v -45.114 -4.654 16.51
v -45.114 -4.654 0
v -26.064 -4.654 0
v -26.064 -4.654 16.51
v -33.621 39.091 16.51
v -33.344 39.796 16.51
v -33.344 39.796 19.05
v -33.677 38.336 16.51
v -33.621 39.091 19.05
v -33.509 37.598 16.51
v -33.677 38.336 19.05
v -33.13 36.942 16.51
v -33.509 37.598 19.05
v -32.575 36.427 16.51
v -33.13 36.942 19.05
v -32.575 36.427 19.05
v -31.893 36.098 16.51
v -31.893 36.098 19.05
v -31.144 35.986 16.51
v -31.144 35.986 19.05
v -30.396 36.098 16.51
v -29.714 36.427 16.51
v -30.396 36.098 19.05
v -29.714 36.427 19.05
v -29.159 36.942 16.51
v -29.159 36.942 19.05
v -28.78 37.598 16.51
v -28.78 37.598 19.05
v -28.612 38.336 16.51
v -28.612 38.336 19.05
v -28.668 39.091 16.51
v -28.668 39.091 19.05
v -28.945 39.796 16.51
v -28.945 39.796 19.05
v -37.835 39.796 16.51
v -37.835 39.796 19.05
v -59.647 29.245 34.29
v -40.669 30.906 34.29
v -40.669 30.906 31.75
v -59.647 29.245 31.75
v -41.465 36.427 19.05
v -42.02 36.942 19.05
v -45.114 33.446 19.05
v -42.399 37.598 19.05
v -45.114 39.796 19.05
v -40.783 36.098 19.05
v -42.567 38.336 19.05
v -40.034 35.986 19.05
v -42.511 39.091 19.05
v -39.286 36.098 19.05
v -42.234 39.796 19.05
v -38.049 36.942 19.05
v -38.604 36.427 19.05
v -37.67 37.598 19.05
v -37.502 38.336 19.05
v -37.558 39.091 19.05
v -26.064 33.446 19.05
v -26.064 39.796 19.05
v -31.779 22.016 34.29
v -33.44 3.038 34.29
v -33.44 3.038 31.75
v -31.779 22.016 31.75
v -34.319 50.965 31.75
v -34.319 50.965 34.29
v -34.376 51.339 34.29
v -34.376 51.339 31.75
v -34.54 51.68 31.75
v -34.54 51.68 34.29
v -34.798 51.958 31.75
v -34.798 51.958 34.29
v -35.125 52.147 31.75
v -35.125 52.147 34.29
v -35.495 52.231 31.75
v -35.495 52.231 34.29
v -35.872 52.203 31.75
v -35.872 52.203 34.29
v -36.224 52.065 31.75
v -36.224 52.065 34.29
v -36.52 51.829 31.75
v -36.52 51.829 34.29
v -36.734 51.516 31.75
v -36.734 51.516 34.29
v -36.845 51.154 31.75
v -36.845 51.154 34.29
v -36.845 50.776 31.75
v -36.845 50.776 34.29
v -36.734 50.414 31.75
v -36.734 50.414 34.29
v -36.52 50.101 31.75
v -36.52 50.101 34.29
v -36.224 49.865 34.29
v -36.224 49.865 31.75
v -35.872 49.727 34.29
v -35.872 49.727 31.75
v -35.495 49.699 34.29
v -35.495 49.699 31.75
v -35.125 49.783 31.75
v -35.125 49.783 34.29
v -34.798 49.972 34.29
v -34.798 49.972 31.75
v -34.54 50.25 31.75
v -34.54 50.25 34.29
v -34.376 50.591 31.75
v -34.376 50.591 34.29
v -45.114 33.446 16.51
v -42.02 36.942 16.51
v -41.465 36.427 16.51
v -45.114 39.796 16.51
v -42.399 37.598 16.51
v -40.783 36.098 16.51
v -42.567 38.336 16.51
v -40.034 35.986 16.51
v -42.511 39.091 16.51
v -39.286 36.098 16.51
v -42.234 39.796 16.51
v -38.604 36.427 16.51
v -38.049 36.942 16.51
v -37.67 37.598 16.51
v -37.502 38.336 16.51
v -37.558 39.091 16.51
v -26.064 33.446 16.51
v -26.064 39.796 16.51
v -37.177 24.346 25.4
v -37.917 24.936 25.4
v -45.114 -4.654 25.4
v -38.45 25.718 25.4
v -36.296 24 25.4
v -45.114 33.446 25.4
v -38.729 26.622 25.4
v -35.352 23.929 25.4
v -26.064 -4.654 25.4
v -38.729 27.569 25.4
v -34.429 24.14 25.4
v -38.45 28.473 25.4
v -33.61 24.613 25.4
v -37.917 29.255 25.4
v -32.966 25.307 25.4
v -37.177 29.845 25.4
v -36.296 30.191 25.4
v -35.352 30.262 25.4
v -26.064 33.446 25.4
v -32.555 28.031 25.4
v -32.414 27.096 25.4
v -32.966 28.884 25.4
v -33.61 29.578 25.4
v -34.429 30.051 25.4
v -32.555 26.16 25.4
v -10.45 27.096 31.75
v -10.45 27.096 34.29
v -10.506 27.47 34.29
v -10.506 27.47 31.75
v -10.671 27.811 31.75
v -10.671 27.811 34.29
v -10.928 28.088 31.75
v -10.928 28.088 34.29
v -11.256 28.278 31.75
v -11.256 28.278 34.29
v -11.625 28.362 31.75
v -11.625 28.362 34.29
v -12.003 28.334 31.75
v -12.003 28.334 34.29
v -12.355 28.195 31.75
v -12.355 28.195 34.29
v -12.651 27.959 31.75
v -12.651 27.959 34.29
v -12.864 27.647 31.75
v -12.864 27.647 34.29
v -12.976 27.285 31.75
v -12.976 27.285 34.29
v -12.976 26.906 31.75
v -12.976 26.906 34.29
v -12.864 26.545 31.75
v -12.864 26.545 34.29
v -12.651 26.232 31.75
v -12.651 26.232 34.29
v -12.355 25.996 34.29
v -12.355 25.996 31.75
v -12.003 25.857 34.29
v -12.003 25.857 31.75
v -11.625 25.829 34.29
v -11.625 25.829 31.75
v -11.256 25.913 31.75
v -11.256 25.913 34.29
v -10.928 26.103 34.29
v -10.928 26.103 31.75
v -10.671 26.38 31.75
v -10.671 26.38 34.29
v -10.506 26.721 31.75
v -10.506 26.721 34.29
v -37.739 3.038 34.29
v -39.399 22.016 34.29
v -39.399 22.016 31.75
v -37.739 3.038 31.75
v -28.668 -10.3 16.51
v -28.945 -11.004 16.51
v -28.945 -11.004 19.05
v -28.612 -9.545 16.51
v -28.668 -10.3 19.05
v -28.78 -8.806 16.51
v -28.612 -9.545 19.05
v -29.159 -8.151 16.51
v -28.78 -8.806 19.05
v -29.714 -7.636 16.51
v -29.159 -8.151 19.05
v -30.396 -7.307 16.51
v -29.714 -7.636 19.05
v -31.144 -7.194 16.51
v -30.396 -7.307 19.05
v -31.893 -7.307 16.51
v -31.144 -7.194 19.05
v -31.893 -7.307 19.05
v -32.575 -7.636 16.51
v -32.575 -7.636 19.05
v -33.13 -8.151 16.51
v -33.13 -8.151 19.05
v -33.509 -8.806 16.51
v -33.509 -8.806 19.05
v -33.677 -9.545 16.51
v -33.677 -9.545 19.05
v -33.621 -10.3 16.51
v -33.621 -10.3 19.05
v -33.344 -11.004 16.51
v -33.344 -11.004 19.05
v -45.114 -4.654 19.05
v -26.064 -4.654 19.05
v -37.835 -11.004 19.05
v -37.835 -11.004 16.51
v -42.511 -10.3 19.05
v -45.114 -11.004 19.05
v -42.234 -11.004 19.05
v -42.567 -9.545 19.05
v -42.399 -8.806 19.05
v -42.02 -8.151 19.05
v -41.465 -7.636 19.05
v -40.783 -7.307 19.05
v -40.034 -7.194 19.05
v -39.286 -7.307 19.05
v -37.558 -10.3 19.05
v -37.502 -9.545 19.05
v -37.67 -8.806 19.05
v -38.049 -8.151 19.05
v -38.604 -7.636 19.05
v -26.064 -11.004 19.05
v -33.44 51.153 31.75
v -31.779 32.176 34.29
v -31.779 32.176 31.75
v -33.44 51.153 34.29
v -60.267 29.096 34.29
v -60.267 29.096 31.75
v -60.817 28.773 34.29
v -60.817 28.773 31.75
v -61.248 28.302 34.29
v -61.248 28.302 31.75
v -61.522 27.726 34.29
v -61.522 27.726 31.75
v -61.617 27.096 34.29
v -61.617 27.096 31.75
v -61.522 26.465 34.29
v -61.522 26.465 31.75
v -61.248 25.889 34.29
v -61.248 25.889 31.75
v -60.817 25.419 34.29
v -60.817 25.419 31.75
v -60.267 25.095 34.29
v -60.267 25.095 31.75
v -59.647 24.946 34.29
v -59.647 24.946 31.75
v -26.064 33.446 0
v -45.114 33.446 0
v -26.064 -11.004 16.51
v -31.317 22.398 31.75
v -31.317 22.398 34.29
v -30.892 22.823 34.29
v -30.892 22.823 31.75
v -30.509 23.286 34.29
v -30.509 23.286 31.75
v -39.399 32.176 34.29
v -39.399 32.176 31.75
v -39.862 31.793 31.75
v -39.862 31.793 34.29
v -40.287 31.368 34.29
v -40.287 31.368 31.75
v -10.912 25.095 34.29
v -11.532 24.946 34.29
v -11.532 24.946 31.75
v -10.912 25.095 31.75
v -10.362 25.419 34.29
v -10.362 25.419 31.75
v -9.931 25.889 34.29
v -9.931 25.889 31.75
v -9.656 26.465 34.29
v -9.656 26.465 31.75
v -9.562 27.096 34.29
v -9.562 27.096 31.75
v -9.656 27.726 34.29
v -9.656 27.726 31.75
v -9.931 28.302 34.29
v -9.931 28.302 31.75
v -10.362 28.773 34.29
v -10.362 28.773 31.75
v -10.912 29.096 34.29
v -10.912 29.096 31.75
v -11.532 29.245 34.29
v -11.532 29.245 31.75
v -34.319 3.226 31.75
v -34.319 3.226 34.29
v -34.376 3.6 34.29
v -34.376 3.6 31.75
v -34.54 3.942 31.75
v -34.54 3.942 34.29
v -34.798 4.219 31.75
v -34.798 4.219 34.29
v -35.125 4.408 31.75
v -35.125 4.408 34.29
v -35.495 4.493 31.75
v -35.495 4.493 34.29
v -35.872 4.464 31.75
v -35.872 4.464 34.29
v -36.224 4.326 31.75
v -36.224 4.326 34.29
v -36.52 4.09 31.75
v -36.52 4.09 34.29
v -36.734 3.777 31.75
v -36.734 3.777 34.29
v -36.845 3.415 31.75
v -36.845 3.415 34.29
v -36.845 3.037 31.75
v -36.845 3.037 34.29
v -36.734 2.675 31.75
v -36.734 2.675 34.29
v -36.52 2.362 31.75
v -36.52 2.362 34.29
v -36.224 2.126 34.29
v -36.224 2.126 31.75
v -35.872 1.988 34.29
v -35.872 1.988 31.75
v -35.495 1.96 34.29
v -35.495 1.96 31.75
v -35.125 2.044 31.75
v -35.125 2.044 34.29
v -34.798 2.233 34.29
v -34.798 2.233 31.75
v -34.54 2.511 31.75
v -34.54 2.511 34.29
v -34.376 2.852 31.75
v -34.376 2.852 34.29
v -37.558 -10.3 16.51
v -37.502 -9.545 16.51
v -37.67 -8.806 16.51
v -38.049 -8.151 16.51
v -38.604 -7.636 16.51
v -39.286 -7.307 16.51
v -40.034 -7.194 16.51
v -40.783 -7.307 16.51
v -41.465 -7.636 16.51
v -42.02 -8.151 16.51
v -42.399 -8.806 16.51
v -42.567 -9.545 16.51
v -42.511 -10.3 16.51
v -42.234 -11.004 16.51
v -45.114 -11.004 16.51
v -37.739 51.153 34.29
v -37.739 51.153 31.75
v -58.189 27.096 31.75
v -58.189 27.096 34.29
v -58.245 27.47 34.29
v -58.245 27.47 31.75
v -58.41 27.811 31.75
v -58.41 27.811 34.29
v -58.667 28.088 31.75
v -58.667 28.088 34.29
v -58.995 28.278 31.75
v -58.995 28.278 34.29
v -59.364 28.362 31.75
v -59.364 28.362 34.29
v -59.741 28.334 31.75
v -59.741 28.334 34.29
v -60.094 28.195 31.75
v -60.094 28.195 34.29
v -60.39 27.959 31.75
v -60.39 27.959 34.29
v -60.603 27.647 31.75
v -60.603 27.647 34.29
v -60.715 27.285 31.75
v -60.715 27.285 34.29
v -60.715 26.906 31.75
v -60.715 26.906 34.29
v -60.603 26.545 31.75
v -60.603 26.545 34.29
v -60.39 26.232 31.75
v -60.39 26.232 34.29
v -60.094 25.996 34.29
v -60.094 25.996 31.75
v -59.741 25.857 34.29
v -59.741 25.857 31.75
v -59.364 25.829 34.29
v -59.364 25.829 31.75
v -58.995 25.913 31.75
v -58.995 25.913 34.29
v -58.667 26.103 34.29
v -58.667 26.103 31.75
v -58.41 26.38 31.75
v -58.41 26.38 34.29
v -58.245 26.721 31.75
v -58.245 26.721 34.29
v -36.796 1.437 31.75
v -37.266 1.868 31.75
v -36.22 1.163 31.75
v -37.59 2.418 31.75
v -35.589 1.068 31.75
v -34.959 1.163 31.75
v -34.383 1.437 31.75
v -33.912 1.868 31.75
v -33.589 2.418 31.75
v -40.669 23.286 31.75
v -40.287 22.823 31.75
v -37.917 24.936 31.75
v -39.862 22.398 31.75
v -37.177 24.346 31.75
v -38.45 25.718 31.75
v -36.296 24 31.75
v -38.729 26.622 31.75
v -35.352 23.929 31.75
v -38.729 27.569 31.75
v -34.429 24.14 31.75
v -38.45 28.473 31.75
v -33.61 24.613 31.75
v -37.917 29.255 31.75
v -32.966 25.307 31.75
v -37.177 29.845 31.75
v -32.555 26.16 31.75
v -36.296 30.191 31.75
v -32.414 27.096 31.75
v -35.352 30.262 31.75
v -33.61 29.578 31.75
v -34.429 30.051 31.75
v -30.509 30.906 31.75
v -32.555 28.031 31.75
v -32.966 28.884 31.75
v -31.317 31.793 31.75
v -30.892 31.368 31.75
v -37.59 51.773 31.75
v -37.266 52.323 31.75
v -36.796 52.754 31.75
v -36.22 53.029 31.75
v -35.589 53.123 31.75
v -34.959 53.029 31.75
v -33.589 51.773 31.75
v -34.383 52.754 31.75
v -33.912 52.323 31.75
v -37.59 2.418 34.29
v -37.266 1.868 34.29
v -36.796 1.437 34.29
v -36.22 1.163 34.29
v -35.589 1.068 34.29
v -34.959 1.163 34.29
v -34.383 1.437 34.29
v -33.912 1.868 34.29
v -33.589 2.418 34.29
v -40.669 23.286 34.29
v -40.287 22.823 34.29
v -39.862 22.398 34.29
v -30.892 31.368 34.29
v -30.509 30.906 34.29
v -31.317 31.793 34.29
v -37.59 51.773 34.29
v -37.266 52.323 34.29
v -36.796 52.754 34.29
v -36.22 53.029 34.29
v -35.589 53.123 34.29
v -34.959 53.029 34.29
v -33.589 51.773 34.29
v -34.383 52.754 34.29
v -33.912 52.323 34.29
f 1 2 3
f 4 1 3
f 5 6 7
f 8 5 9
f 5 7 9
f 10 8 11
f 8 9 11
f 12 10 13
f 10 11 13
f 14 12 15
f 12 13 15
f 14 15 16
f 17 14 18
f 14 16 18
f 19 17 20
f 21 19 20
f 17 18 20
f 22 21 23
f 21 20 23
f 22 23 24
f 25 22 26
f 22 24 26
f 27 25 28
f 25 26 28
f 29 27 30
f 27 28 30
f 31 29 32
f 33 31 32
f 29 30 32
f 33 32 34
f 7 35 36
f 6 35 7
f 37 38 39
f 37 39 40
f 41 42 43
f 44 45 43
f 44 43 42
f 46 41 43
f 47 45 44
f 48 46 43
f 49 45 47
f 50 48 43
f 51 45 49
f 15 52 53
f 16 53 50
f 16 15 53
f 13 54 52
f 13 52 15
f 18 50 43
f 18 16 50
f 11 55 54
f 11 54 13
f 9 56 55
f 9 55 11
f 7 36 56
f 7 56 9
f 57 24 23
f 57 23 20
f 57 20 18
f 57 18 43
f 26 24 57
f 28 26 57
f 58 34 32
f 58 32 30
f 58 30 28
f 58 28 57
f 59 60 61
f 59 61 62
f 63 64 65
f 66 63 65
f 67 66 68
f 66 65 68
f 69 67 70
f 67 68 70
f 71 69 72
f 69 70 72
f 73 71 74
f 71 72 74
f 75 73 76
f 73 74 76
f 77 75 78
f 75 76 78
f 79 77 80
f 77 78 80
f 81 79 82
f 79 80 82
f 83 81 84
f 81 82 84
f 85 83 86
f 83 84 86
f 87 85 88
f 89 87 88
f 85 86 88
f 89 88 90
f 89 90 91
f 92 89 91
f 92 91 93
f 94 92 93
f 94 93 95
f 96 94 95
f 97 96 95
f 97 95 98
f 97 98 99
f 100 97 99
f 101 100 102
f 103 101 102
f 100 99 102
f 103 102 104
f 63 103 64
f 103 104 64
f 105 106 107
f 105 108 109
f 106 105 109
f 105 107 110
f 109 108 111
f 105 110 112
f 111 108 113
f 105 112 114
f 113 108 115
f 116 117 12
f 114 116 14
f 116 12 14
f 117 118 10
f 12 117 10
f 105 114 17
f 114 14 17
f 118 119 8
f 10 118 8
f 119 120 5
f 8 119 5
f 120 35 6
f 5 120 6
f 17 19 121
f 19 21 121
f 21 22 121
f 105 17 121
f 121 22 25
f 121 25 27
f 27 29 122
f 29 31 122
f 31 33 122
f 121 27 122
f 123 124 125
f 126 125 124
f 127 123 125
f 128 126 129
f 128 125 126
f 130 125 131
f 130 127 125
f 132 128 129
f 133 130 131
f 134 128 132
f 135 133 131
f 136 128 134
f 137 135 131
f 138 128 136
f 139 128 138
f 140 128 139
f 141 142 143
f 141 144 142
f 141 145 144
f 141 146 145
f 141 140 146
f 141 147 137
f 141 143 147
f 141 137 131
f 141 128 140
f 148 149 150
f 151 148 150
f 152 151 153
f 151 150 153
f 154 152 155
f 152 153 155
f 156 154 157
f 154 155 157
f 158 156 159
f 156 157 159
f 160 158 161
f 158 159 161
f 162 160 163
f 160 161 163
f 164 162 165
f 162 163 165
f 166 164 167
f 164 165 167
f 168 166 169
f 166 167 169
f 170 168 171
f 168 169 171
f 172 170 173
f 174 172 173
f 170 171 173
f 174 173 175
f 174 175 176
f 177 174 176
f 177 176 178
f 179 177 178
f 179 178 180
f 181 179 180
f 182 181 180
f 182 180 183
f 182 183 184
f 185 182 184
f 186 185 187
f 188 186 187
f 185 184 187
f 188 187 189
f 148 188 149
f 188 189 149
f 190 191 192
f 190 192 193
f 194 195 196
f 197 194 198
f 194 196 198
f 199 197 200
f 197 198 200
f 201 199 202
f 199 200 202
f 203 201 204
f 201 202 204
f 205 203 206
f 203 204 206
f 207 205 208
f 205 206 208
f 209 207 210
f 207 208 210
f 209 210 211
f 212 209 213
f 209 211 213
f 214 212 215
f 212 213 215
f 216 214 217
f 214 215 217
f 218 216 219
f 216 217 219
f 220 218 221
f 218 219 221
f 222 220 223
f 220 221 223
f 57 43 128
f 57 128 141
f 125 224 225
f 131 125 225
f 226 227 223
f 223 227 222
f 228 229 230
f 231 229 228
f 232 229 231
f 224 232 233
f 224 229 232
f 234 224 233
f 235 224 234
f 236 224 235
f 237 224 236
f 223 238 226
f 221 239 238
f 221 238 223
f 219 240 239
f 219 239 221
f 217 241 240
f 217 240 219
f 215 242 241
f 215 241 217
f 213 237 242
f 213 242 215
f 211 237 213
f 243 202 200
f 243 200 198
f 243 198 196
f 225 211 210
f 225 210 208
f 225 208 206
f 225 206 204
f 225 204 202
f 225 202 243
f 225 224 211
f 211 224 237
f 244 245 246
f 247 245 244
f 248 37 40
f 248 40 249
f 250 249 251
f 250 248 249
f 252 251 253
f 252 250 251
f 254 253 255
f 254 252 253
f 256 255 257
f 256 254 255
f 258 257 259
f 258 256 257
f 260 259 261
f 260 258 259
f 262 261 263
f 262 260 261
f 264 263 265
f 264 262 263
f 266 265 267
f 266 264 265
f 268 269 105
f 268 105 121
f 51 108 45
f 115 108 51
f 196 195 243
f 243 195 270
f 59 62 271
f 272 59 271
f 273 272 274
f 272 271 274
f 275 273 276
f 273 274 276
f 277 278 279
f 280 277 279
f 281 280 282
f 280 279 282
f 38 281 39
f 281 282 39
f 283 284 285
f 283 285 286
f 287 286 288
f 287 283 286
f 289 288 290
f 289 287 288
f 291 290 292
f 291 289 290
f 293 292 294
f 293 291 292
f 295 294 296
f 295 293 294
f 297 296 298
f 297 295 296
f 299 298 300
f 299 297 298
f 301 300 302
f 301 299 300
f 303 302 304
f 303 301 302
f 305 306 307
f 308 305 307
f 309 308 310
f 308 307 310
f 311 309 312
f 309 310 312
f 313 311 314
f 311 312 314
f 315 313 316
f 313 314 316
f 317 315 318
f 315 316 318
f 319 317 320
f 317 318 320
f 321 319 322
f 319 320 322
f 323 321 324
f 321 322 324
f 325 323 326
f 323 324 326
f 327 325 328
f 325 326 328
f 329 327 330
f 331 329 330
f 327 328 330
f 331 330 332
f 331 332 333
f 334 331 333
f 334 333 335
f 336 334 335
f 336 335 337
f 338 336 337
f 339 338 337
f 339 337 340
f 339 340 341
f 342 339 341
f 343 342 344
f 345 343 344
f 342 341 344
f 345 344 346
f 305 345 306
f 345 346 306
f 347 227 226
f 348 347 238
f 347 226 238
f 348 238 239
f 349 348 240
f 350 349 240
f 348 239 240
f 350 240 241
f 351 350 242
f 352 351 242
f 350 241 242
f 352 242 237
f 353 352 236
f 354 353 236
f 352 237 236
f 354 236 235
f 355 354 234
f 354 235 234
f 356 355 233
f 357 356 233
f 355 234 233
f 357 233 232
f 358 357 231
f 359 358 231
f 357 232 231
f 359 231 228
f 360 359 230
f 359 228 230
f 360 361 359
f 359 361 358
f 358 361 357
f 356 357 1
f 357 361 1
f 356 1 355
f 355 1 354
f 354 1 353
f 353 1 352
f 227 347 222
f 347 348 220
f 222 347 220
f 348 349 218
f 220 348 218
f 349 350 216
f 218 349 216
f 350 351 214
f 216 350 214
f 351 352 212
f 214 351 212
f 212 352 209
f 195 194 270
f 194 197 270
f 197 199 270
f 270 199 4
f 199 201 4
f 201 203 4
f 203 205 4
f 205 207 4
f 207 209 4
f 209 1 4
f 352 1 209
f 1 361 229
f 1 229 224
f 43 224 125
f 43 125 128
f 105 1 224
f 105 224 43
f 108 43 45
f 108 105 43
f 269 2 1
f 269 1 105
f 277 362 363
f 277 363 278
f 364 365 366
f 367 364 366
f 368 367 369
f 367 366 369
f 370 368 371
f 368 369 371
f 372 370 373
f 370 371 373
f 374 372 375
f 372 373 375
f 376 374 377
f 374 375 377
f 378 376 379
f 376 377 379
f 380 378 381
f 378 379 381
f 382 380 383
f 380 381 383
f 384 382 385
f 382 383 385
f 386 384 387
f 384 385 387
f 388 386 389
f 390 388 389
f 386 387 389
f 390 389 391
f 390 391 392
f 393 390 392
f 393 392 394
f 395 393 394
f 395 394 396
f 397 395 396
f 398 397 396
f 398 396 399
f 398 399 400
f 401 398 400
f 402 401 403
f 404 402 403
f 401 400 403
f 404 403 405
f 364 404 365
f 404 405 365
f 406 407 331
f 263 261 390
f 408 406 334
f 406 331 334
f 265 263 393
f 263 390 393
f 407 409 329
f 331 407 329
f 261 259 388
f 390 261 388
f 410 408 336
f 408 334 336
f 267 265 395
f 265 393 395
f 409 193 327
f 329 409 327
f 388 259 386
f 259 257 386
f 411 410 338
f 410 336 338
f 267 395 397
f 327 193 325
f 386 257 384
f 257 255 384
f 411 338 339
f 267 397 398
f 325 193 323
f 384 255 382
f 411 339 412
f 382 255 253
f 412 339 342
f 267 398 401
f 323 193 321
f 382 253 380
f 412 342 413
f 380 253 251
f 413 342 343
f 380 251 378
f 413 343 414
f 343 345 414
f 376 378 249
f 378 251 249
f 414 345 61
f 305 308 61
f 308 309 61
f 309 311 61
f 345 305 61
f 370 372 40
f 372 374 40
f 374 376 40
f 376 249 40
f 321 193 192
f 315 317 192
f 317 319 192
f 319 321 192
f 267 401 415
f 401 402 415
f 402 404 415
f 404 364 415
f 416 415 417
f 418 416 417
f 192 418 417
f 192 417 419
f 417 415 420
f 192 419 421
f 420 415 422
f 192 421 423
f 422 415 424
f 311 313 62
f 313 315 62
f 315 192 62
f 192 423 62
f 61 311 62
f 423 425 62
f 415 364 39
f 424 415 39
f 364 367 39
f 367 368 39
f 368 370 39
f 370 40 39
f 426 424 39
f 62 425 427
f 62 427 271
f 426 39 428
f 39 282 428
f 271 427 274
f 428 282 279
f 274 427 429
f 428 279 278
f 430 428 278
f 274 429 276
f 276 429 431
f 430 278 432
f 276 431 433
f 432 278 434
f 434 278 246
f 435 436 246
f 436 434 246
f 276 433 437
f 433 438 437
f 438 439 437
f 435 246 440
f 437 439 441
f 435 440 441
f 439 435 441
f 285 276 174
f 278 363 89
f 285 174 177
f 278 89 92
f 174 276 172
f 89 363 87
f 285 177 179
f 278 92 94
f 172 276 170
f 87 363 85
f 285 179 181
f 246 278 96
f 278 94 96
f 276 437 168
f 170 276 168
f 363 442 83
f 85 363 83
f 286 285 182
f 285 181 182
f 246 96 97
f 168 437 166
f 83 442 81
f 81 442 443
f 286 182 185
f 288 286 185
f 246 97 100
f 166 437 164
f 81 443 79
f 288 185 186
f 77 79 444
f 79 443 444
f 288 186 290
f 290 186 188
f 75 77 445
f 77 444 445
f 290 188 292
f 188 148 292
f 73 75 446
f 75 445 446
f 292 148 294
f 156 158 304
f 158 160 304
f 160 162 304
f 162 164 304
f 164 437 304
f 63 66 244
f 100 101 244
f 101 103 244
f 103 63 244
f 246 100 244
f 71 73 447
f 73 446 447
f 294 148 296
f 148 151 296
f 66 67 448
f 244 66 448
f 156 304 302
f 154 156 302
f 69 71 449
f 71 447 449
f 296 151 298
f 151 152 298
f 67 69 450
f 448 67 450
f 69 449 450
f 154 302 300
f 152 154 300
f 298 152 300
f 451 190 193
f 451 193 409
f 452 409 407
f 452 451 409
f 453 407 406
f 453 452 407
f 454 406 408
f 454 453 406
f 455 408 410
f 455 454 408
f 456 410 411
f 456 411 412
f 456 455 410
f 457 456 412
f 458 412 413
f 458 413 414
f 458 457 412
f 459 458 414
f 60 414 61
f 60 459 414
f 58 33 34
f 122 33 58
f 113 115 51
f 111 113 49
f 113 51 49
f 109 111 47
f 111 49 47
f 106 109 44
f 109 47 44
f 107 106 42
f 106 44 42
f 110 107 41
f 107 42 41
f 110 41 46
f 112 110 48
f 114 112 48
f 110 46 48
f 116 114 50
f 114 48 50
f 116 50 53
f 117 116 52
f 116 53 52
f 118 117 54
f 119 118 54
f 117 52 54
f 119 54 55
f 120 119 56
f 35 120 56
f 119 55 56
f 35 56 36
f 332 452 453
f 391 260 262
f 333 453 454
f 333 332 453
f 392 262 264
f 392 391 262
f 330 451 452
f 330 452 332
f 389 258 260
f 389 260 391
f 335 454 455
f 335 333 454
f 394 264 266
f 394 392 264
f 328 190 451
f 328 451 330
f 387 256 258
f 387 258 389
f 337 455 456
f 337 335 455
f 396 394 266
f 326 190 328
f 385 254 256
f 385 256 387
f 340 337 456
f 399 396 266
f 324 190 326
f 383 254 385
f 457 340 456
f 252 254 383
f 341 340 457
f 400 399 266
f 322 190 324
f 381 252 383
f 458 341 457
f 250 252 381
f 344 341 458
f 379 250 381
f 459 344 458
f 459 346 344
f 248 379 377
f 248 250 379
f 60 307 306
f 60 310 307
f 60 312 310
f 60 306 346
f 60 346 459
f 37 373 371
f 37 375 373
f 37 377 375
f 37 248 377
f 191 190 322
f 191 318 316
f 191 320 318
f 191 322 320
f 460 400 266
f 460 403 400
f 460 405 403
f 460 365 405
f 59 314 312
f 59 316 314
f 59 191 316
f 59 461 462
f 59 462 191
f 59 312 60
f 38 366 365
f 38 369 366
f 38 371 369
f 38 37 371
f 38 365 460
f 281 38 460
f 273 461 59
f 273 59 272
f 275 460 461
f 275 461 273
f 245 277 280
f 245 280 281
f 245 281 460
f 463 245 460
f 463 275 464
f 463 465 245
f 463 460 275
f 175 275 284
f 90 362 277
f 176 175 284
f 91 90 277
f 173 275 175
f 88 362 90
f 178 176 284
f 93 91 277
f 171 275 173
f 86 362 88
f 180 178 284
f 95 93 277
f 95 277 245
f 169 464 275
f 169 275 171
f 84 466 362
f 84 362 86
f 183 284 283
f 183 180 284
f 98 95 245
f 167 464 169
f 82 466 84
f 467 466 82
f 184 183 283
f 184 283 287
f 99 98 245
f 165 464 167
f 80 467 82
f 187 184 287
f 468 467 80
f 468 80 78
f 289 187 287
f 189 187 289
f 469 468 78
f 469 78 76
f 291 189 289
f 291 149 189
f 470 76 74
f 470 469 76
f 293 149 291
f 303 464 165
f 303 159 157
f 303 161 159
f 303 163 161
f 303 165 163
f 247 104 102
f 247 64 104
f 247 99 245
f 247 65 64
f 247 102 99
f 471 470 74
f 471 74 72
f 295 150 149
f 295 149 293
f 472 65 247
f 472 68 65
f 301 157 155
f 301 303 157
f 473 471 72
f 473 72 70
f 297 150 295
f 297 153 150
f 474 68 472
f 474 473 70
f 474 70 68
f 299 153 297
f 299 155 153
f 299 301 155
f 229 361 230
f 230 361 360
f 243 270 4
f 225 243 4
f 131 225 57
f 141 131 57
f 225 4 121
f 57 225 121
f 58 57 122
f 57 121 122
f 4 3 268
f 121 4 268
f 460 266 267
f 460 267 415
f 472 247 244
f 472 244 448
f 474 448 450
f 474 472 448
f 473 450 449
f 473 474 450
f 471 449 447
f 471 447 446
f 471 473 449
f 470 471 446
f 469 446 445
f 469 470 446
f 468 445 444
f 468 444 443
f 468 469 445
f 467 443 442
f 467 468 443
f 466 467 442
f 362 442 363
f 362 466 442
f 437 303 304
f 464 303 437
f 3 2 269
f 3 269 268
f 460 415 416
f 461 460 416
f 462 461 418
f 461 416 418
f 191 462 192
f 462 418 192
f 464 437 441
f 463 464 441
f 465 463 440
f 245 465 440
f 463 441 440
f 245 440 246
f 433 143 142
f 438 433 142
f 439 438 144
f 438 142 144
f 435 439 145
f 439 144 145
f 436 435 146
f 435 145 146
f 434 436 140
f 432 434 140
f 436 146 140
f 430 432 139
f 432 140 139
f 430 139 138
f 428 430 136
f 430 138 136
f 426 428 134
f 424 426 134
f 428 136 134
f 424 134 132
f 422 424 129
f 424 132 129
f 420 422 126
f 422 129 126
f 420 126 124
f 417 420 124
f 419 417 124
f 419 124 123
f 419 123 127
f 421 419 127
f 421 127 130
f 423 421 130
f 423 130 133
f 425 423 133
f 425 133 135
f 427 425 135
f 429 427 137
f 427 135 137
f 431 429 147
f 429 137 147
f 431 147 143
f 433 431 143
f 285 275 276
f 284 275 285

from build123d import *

# Parameters (mm, degrees)
F0_W      = 19.05
F0_H      = 38.1
F1_DEPTH  = 16.51
F2_W      = 19.05
F2_H      = 50.8
F3_DEPTH  = 2.54
F4_R      = 2.54
F5_DEPTH  = 2.54
F6_W      = 19.05
F6_H      = 38.1
F7_DEPTH  = 6.35
F8_R      = 3.175
F9_DEPTH  = 6.35
F10_R     = 6.35
F11_DEPTH = 2.54
F12_R     = 1.27
F13_DEPTH = 2.54


with BuildPart() as f1:
    # F0 (on Top) → F1 (new body)
    with BuildSketch(Plane.XY):
        with Locations((-35.5894370005, 14.3955526778)):
            Rectangle(F0_W, F0_H)
    extrude(amount=F1_DEPTH)

    # F2 (on face) → F3 (join)
    with BuildSketch(Plane.XY.offset(16.51)):
        with Locations((-35.5894370005, 14.3955526778)):
            Rectangle(F2_W, F2_H)
    extrude(amount=F3_DEPTH)

    # F4 (on face) → F5 (cut)
    with BuildSketch(Plane.XY.offset(19.05)):
        with Locations((-40.0344370005, 38.5255526778)):
            Circle(F4_R)
        with Locations((-31.1444370005, 38.5255526778)):
            Circle(F4_R)
        with Locations((-31.1444370005, -9.7344473222)):
            Circle(F4_R)
        with Locations((-40.0344370005, -9.7344473222)):
            Circle(F4_R)
    extrude(amount=-F5_DEPTH, mode=Mode.SUBTRACT)

    # F6 (on face) → F7 (join)
    with BuildSketch(Plane.XY.offset(19.05)):
        with Locations((-35.5894370005, 14.3955526778)):
            Rectangle(F6_W, F6_H)
    extrude(amount=F7_DEPTH)

    # F8 (on face) → F9 (join)
    with BuildSketch(Plane.XY.offset(25.4)):
        with Locations((-35.5894370005, 27.0955526778)):
            Circle(F8_R)
    extrude(amount=F9_DEPTH)

    # F10 (on face) → F11 (join)
    with BuildSketch(Plane.XY.offset(31.75)):
        with Locations((-35.5894370005, 27.0955526778)):
            Circle(F10_R)
    extrude(amount=F11_DEPTH)

    # F12 (on face) → F13 (join)
    with BuildSketch(Plane.XY.offset(34.29)):
        with BuildLine():
            Line((-37.7391201011, 51.1530616765), (-39.3994370005, 32.1755526778))
            ThreePointArc((-39.3994370005, 32.1755526778), (-35.5894370005, 33.4455526778), (-31.7794370005, 32.1755526778))
            Line((-31.7794370005, 32.1755526778), (-33.4397538998, 51.1530616765))
            ThreePointArc((-33.4397538998, 51.1530616765), (-35.5894370005, 53.1228833158), (-37.7391201011, 51.1530616765))
        make_face()
        with Locations((-35.5894370005, 50.964988775)):
            Circle(F12_R, mode=Mode.SUBTRACT)
        with BuildLine():
            Line((-11.5319280018, 29.2452357785), (-30.5094370005, 30.9055526778))
            ThreePointArc((-30.5094370005, 30.9055526778), (-29.2394370005, 27.0955526778), (-30.5094370005, 23.2855526778))
            Line((-30.5094370005, 23.2855526778), (-11.5319280018, 24.9458695772))
            ThreePointArc((-11.5319280018, 24.9458695772), (-9.5621063624, 27.0955526778), (-11.5319280018, 29.2452357785))
        make_face()
        with Locations((-11.7200009033, 27.0955526778)):
            Circle(F12_R, mode=Mode.SUBTRACT)
        with BuildLine():
            Line((-33.4397538998, 3.0380436792), (-31.7794370005, 22.0155526778))
            ThreePointArc((-31.7794370005, 22.0155526778), (-35.5894370005, 20.7455526778), (-39.3994370005, 22.0155526778))
            Line((-39.3994370005, 22.0155526778), (-37.7391201011, 3.0380436792))
            ThreePointArc((-37.7391201011, 3.0380436792), (-35.5894370005, 1.0682220398), (-33.4397538998, 3.0380436792))
        make_face()
        with Locations((-35.5894370005, 3.2261165806)):
            Circle(F12_R, mode=Mode.SUBTRACT)
        with BuildLine():
            ThreePointArc((-40.6694370005, 23.2855526778), (-41.9394370005, 27.0955526778), (-40.6694370005, 30.9055526778))
            Line((-40.6694370005, 30.9055526778), (-59.6469459991, 29.2452357785))
            ThreePointArc((-59.6469459991, 29.2452357785), (-61.6167676385, 27.0955526778), (-59.6469459991, 24.9458695772))
            Line((-59.6469459991, 24.9458695772), (-40.6694370005, 23.2855526778))
        make_face()
        with Locations((-59.4588730976, 27.0955526778)):
            Circle(F12_R, mode=Mode.SUBTRACT)
    extrude(amount=-F13_DEPTH)


solid = f1.part
